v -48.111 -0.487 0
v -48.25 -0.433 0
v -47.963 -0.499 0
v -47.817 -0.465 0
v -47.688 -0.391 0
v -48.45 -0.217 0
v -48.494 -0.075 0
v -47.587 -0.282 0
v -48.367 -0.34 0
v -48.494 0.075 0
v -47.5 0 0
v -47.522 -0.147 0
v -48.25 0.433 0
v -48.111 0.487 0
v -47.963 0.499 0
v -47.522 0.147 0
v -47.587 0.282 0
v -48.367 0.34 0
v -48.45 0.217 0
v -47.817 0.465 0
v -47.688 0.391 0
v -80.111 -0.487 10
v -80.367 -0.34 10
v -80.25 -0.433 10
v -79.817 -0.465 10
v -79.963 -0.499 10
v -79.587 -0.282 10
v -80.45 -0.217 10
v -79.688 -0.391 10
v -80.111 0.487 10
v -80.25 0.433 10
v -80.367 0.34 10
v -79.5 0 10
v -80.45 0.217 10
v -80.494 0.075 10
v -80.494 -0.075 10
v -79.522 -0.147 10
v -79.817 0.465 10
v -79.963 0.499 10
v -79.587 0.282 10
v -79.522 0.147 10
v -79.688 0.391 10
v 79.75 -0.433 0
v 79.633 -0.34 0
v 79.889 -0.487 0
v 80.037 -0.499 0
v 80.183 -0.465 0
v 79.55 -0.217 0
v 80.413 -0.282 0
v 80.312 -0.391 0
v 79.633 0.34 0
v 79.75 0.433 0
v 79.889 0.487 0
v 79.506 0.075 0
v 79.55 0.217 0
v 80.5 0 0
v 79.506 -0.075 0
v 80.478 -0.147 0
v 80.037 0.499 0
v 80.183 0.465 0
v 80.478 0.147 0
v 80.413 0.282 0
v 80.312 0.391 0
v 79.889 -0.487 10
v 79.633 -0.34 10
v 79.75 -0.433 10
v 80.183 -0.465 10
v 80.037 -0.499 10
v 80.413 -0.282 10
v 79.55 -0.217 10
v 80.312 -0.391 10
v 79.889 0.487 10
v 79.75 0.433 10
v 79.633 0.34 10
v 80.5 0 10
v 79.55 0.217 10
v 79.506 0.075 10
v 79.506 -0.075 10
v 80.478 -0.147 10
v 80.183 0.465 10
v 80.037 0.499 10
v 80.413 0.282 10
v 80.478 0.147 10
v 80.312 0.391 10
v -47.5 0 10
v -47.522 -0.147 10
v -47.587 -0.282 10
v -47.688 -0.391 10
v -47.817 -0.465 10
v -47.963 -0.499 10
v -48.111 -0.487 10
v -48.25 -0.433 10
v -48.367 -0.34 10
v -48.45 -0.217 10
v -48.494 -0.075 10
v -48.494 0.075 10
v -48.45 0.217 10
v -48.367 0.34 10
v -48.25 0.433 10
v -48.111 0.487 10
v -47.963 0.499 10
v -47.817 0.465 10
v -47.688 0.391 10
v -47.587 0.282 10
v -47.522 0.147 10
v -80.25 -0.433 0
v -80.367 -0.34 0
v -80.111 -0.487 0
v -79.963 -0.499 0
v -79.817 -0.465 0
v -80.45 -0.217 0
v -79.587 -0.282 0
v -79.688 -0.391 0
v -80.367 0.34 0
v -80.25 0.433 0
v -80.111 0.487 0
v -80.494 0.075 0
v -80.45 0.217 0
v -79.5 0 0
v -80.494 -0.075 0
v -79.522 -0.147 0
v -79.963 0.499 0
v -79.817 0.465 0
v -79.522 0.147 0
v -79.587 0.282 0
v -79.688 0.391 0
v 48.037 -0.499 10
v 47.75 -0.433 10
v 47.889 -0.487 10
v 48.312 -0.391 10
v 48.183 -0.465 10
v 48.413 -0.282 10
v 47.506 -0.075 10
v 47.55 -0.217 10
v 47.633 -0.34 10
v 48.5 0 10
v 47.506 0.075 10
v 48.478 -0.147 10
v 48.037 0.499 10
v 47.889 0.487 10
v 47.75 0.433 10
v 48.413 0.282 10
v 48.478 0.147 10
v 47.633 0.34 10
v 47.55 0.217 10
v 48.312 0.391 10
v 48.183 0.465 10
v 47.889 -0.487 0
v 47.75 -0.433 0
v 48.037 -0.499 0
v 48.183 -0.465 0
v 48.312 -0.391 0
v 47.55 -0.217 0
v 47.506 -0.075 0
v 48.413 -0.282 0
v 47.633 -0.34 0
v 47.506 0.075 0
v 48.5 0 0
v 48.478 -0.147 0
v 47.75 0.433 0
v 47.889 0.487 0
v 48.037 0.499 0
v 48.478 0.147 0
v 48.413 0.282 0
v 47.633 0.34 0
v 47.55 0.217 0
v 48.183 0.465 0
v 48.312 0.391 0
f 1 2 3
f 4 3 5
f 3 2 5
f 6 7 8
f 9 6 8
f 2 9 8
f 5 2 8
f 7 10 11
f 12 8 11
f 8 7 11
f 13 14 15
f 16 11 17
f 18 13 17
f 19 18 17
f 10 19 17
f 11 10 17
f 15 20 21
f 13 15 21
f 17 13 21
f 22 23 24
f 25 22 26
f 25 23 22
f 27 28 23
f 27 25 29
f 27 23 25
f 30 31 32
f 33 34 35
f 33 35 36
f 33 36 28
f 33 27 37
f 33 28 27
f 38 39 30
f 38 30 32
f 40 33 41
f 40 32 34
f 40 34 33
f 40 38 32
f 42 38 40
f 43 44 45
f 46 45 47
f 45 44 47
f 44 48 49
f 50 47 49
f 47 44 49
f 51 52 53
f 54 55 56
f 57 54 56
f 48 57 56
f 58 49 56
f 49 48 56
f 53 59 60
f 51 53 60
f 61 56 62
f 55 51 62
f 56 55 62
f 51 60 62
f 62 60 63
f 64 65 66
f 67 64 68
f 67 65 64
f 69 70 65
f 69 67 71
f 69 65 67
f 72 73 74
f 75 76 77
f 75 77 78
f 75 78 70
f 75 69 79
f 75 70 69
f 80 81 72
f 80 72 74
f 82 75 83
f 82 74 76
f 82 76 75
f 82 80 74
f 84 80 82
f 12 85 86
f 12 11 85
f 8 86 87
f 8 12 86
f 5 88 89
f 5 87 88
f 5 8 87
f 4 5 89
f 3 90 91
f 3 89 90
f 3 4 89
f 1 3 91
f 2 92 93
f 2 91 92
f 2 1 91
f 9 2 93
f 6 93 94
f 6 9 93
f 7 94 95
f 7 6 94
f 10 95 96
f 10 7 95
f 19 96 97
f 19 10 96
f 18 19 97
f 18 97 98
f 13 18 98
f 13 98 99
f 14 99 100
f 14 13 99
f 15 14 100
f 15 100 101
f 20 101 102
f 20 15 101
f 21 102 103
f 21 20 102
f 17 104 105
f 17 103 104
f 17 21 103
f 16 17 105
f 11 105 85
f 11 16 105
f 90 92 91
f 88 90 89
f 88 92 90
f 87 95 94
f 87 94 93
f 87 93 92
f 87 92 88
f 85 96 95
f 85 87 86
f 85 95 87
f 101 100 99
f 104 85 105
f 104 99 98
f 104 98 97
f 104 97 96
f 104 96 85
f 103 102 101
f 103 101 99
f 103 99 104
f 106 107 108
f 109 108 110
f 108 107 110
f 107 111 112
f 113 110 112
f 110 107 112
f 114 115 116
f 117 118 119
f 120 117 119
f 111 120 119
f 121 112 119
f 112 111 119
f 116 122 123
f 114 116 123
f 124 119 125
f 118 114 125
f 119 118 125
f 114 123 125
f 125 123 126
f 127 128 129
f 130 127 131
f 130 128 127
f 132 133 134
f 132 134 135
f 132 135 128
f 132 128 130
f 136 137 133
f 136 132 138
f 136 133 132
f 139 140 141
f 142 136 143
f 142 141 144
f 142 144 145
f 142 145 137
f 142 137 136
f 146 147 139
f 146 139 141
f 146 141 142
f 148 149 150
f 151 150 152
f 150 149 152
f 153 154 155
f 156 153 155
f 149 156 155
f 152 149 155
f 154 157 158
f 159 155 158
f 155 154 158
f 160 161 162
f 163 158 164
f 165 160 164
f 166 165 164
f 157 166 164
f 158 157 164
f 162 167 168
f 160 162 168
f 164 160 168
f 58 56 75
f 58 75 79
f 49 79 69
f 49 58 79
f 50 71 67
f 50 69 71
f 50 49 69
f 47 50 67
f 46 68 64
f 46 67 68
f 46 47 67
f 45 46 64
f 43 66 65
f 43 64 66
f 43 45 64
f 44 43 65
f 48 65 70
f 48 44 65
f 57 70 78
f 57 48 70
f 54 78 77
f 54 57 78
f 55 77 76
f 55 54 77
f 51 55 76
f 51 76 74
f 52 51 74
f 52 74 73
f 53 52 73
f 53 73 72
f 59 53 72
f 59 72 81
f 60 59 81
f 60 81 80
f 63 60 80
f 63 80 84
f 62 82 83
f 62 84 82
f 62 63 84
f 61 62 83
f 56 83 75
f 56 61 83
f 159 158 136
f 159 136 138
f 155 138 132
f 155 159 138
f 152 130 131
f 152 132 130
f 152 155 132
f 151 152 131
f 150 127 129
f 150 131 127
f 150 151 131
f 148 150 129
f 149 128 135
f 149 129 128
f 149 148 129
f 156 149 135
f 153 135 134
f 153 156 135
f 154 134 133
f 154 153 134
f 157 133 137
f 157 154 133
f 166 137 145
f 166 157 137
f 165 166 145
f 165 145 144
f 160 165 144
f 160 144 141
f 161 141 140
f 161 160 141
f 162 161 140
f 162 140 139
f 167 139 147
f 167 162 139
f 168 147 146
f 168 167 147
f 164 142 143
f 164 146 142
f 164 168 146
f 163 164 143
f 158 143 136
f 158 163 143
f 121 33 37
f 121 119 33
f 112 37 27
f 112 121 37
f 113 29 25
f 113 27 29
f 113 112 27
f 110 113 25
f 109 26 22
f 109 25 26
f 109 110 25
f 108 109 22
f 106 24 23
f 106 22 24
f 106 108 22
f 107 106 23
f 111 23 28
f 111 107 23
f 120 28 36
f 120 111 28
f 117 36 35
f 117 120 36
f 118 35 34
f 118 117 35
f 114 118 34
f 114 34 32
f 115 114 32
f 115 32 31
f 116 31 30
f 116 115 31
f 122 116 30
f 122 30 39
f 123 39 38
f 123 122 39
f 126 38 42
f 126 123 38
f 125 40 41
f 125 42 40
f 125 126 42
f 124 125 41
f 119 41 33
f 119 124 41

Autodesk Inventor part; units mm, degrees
ref_plane "YZ Plane" through (0, 0, 0) normal (1, 0, 0) x (0, 1, 0)
ref_plane "XZ Plane" through (0, 0, 0) normal (0, 1, 0) x (-1, 0, 0)
ref_plane "XY Plane" through (0, 0, 0) normal (0, 0, 1) x (1, 0, 0)
sketch "Sketch1" plane through (0, 0, 0) normal (0, 0, 1) x (1, 0, 0)
  line L0 (-150, -11.5) -> (150, -11.5)
  line L1 (150, -11.5) -> (150, 11.5)
  line L2 (150, 11.5) -> (-150, 11.5)
  line L3 (-150, 11.5) -> (-150, -11.5)
  line L4 (-150, -11.5) -> (150, 11.5) construction
  line L5 (150, -11.5) -> (-150, 11.5) construction
  point P0 (0, 0)
  dimension "d0" = 300
  dimension "d1" = 23
sketch "Sketch2" plane through (0, 0, 0) normal (0, 0, 1) x (1, 0, 0)
  circle A0 centre (80, 0) radius 0.5
  line L0 (150, 11.5) -> (-150, 11.5) projected
  line L1 (-150, -11.5) -> (150, -11.5) projected
  line L2 (0, -16.1) -> (0, 16.1) projected
  line L3 (150, -11.5) -> (150, 11.5) projected
  point P0 (0, 0)
  dimension "d3" = 11.5
  dimension "d4" = 1
  dimension "d26" = 70
extrude "Extrusion1" add sketch "Sketch2" along normal blind 10 contours A0
pattern_linear "Minifix Array" count 2 spacing 160 along (-1, 0, 0) of "Extrusion1"
sketch "Sketch3" plane through (0, 0, 0) normal (0, 0, 1) x (1, 0, 0)
  circle A0 centre (48, 0) radius 0.5
  circle A1 centre (80, 0) radius 0.5 projected
  point P0 (0, 0)
  dimension "OffsetForGreen" = 32
extrude "Extrusion2" add sketch "Sketch3" along normal blind 10 separate body contours A0
pattern_of_one "Left Dowel Array" bodies 2
sketch "Sketch4" plane through (0, 0, 0) normal (0, 0, 1) x (1, 0, 0)
  line L0 (-150, 11.5) -> (-150, -11.5) projected
  circle A0 centre (-48, 0) radius 0.5
  circle A1 centre (80, 0) radius 0.5 projected
  line L1 (150, -11.5) -> (150, 11.5) projected
  line L2 (150, -16.9659) -> (150, 19.2384)
  circle A2 centre (48, 0) radius 0.5 projected
  point P0 (0, 0)
  dimension "OffsetForYellow" = 198
  dimension "OffsetForRefLine" = 70
extrude "Extrusion3" add sketch "Sketch4" along normal blind 10 separate body contours A0
pattern_of_one "Right Dowel Array" bodies 3
equation "\"d3\" = Y_Coord"
equation "\"d26\" = X_Coord"
equation "\"d9\" = Step"
equation "\"d16\" = Step"
equation "\"d23\" = Step"
equation "\"d0\" = ContactPatchWidth"
equation "\"d1\" = ContactPatchHeight"
equation "\"ContactPatchWidth\" = 300"
equation "\"ContactPatchHeight\" = 23"
equation "\"PlacingStep\" = 32"
equation "\"X_Coord\" = 70"
equation "\"Step\" = 160"
equation "\"Y_Coord\" = 11.5"
equation "\"MaxDistBetweenByStep\" = 192"
properties part number "Minfix&Dowel Joint"
